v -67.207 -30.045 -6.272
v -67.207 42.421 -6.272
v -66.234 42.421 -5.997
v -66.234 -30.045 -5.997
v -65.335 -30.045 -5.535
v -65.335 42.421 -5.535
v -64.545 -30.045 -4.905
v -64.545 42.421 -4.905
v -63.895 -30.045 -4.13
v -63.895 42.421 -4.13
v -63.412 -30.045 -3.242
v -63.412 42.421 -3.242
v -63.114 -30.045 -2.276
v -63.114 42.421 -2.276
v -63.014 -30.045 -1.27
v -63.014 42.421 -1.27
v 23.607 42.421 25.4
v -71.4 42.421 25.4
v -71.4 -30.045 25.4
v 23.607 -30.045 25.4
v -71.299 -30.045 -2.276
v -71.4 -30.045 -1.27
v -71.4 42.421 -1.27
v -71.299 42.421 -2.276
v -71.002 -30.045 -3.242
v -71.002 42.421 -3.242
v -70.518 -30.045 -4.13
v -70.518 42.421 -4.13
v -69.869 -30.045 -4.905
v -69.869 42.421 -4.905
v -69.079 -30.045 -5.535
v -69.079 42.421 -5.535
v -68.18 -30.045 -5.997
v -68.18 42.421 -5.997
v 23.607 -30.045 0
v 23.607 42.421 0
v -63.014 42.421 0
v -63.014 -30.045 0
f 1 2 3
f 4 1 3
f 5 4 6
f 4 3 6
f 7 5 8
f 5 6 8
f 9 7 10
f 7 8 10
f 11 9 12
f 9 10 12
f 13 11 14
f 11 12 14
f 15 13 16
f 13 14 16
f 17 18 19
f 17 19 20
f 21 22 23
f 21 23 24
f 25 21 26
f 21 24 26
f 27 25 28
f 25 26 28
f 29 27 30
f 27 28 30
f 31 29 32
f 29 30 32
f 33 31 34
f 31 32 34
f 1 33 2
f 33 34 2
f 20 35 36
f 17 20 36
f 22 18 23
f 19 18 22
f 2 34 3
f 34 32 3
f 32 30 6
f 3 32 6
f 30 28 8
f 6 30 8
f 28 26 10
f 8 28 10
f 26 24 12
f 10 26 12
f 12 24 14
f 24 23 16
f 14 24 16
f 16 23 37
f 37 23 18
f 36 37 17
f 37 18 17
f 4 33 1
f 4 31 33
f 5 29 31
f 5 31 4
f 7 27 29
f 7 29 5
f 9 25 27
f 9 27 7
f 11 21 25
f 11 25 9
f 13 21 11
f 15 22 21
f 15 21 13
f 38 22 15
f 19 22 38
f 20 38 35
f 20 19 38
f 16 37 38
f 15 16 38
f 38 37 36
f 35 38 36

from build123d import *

# Parameters (mm, degrees)
F0_W        = 95.0071103871
F0_H        = 72.4661517888
F1_DEPTH    = 25.4
F2_W        = 8.3860605955
F2_H        = 72.4661517888
F3_DEPTH    = 6.35
F4_T1_DEPTH = 97.8661517888


# Not quite as in the source:
# - a fillet or chamfer that OpenCascade refuses, or shapes differently, is made with other operations: its cross-section is extruded or revolved along the edge and cut away or added


with BuildPart() as f1:
    # F0 (on Top) → F1 (new body)
    with BuildSketch(Plane.XY):
        with Locations((-23.8963868469, 6.1882724985)):
            Rectangle(F0_W, F0_H)
    extrude(amount=F1_DEPTH)

    # F2 (on face) → F3 (join)
    with BuildSketch(Plane(origin=(0, 0, 0), x_dir=(1, 0, 0), z_dir=(0, 0, -1))):
        with Locations((-67.2069117427, -6.1882724985)):
            Rectangle(F2_W, F2_H)
    extrude(amount=F3_DEPTH)

    # F4: fillet of radius 5.08 on 2 edges, made by hand

    # F4_s2 → F4_t1 (cut)
    with BuildSketch(Plane.XZ.offset(-55.121348393)):
        with BuildLine():
            ThreePointArc((-68.0938814449, -6.35), (-64.5017789965, -4.8621024484), (-63.0138814449, -1.27))
            Line((-63.0138814449, -1.27), (-63.0138814449, -6.35))
            Line((-63.0138814449, -6.35), (-68.0938814449, -6.35))
        make_face()
        with BuildLine():
            ThreePointArc((-71.3999420404, -1.27), (-69.9120444889, -4.8621024484), (-66.3199420404, -6.35))
            Line((-66.3199420404, -6.35), (-71.3999420404, -6.35))
            Line((-71.3999420404, -6.35), (-71.3999420404, -1.27))
        make_face()
    extrude(amount=F4_T1_DEPTH, mode=Mode.SUBTRACT)


solid = f1.part
